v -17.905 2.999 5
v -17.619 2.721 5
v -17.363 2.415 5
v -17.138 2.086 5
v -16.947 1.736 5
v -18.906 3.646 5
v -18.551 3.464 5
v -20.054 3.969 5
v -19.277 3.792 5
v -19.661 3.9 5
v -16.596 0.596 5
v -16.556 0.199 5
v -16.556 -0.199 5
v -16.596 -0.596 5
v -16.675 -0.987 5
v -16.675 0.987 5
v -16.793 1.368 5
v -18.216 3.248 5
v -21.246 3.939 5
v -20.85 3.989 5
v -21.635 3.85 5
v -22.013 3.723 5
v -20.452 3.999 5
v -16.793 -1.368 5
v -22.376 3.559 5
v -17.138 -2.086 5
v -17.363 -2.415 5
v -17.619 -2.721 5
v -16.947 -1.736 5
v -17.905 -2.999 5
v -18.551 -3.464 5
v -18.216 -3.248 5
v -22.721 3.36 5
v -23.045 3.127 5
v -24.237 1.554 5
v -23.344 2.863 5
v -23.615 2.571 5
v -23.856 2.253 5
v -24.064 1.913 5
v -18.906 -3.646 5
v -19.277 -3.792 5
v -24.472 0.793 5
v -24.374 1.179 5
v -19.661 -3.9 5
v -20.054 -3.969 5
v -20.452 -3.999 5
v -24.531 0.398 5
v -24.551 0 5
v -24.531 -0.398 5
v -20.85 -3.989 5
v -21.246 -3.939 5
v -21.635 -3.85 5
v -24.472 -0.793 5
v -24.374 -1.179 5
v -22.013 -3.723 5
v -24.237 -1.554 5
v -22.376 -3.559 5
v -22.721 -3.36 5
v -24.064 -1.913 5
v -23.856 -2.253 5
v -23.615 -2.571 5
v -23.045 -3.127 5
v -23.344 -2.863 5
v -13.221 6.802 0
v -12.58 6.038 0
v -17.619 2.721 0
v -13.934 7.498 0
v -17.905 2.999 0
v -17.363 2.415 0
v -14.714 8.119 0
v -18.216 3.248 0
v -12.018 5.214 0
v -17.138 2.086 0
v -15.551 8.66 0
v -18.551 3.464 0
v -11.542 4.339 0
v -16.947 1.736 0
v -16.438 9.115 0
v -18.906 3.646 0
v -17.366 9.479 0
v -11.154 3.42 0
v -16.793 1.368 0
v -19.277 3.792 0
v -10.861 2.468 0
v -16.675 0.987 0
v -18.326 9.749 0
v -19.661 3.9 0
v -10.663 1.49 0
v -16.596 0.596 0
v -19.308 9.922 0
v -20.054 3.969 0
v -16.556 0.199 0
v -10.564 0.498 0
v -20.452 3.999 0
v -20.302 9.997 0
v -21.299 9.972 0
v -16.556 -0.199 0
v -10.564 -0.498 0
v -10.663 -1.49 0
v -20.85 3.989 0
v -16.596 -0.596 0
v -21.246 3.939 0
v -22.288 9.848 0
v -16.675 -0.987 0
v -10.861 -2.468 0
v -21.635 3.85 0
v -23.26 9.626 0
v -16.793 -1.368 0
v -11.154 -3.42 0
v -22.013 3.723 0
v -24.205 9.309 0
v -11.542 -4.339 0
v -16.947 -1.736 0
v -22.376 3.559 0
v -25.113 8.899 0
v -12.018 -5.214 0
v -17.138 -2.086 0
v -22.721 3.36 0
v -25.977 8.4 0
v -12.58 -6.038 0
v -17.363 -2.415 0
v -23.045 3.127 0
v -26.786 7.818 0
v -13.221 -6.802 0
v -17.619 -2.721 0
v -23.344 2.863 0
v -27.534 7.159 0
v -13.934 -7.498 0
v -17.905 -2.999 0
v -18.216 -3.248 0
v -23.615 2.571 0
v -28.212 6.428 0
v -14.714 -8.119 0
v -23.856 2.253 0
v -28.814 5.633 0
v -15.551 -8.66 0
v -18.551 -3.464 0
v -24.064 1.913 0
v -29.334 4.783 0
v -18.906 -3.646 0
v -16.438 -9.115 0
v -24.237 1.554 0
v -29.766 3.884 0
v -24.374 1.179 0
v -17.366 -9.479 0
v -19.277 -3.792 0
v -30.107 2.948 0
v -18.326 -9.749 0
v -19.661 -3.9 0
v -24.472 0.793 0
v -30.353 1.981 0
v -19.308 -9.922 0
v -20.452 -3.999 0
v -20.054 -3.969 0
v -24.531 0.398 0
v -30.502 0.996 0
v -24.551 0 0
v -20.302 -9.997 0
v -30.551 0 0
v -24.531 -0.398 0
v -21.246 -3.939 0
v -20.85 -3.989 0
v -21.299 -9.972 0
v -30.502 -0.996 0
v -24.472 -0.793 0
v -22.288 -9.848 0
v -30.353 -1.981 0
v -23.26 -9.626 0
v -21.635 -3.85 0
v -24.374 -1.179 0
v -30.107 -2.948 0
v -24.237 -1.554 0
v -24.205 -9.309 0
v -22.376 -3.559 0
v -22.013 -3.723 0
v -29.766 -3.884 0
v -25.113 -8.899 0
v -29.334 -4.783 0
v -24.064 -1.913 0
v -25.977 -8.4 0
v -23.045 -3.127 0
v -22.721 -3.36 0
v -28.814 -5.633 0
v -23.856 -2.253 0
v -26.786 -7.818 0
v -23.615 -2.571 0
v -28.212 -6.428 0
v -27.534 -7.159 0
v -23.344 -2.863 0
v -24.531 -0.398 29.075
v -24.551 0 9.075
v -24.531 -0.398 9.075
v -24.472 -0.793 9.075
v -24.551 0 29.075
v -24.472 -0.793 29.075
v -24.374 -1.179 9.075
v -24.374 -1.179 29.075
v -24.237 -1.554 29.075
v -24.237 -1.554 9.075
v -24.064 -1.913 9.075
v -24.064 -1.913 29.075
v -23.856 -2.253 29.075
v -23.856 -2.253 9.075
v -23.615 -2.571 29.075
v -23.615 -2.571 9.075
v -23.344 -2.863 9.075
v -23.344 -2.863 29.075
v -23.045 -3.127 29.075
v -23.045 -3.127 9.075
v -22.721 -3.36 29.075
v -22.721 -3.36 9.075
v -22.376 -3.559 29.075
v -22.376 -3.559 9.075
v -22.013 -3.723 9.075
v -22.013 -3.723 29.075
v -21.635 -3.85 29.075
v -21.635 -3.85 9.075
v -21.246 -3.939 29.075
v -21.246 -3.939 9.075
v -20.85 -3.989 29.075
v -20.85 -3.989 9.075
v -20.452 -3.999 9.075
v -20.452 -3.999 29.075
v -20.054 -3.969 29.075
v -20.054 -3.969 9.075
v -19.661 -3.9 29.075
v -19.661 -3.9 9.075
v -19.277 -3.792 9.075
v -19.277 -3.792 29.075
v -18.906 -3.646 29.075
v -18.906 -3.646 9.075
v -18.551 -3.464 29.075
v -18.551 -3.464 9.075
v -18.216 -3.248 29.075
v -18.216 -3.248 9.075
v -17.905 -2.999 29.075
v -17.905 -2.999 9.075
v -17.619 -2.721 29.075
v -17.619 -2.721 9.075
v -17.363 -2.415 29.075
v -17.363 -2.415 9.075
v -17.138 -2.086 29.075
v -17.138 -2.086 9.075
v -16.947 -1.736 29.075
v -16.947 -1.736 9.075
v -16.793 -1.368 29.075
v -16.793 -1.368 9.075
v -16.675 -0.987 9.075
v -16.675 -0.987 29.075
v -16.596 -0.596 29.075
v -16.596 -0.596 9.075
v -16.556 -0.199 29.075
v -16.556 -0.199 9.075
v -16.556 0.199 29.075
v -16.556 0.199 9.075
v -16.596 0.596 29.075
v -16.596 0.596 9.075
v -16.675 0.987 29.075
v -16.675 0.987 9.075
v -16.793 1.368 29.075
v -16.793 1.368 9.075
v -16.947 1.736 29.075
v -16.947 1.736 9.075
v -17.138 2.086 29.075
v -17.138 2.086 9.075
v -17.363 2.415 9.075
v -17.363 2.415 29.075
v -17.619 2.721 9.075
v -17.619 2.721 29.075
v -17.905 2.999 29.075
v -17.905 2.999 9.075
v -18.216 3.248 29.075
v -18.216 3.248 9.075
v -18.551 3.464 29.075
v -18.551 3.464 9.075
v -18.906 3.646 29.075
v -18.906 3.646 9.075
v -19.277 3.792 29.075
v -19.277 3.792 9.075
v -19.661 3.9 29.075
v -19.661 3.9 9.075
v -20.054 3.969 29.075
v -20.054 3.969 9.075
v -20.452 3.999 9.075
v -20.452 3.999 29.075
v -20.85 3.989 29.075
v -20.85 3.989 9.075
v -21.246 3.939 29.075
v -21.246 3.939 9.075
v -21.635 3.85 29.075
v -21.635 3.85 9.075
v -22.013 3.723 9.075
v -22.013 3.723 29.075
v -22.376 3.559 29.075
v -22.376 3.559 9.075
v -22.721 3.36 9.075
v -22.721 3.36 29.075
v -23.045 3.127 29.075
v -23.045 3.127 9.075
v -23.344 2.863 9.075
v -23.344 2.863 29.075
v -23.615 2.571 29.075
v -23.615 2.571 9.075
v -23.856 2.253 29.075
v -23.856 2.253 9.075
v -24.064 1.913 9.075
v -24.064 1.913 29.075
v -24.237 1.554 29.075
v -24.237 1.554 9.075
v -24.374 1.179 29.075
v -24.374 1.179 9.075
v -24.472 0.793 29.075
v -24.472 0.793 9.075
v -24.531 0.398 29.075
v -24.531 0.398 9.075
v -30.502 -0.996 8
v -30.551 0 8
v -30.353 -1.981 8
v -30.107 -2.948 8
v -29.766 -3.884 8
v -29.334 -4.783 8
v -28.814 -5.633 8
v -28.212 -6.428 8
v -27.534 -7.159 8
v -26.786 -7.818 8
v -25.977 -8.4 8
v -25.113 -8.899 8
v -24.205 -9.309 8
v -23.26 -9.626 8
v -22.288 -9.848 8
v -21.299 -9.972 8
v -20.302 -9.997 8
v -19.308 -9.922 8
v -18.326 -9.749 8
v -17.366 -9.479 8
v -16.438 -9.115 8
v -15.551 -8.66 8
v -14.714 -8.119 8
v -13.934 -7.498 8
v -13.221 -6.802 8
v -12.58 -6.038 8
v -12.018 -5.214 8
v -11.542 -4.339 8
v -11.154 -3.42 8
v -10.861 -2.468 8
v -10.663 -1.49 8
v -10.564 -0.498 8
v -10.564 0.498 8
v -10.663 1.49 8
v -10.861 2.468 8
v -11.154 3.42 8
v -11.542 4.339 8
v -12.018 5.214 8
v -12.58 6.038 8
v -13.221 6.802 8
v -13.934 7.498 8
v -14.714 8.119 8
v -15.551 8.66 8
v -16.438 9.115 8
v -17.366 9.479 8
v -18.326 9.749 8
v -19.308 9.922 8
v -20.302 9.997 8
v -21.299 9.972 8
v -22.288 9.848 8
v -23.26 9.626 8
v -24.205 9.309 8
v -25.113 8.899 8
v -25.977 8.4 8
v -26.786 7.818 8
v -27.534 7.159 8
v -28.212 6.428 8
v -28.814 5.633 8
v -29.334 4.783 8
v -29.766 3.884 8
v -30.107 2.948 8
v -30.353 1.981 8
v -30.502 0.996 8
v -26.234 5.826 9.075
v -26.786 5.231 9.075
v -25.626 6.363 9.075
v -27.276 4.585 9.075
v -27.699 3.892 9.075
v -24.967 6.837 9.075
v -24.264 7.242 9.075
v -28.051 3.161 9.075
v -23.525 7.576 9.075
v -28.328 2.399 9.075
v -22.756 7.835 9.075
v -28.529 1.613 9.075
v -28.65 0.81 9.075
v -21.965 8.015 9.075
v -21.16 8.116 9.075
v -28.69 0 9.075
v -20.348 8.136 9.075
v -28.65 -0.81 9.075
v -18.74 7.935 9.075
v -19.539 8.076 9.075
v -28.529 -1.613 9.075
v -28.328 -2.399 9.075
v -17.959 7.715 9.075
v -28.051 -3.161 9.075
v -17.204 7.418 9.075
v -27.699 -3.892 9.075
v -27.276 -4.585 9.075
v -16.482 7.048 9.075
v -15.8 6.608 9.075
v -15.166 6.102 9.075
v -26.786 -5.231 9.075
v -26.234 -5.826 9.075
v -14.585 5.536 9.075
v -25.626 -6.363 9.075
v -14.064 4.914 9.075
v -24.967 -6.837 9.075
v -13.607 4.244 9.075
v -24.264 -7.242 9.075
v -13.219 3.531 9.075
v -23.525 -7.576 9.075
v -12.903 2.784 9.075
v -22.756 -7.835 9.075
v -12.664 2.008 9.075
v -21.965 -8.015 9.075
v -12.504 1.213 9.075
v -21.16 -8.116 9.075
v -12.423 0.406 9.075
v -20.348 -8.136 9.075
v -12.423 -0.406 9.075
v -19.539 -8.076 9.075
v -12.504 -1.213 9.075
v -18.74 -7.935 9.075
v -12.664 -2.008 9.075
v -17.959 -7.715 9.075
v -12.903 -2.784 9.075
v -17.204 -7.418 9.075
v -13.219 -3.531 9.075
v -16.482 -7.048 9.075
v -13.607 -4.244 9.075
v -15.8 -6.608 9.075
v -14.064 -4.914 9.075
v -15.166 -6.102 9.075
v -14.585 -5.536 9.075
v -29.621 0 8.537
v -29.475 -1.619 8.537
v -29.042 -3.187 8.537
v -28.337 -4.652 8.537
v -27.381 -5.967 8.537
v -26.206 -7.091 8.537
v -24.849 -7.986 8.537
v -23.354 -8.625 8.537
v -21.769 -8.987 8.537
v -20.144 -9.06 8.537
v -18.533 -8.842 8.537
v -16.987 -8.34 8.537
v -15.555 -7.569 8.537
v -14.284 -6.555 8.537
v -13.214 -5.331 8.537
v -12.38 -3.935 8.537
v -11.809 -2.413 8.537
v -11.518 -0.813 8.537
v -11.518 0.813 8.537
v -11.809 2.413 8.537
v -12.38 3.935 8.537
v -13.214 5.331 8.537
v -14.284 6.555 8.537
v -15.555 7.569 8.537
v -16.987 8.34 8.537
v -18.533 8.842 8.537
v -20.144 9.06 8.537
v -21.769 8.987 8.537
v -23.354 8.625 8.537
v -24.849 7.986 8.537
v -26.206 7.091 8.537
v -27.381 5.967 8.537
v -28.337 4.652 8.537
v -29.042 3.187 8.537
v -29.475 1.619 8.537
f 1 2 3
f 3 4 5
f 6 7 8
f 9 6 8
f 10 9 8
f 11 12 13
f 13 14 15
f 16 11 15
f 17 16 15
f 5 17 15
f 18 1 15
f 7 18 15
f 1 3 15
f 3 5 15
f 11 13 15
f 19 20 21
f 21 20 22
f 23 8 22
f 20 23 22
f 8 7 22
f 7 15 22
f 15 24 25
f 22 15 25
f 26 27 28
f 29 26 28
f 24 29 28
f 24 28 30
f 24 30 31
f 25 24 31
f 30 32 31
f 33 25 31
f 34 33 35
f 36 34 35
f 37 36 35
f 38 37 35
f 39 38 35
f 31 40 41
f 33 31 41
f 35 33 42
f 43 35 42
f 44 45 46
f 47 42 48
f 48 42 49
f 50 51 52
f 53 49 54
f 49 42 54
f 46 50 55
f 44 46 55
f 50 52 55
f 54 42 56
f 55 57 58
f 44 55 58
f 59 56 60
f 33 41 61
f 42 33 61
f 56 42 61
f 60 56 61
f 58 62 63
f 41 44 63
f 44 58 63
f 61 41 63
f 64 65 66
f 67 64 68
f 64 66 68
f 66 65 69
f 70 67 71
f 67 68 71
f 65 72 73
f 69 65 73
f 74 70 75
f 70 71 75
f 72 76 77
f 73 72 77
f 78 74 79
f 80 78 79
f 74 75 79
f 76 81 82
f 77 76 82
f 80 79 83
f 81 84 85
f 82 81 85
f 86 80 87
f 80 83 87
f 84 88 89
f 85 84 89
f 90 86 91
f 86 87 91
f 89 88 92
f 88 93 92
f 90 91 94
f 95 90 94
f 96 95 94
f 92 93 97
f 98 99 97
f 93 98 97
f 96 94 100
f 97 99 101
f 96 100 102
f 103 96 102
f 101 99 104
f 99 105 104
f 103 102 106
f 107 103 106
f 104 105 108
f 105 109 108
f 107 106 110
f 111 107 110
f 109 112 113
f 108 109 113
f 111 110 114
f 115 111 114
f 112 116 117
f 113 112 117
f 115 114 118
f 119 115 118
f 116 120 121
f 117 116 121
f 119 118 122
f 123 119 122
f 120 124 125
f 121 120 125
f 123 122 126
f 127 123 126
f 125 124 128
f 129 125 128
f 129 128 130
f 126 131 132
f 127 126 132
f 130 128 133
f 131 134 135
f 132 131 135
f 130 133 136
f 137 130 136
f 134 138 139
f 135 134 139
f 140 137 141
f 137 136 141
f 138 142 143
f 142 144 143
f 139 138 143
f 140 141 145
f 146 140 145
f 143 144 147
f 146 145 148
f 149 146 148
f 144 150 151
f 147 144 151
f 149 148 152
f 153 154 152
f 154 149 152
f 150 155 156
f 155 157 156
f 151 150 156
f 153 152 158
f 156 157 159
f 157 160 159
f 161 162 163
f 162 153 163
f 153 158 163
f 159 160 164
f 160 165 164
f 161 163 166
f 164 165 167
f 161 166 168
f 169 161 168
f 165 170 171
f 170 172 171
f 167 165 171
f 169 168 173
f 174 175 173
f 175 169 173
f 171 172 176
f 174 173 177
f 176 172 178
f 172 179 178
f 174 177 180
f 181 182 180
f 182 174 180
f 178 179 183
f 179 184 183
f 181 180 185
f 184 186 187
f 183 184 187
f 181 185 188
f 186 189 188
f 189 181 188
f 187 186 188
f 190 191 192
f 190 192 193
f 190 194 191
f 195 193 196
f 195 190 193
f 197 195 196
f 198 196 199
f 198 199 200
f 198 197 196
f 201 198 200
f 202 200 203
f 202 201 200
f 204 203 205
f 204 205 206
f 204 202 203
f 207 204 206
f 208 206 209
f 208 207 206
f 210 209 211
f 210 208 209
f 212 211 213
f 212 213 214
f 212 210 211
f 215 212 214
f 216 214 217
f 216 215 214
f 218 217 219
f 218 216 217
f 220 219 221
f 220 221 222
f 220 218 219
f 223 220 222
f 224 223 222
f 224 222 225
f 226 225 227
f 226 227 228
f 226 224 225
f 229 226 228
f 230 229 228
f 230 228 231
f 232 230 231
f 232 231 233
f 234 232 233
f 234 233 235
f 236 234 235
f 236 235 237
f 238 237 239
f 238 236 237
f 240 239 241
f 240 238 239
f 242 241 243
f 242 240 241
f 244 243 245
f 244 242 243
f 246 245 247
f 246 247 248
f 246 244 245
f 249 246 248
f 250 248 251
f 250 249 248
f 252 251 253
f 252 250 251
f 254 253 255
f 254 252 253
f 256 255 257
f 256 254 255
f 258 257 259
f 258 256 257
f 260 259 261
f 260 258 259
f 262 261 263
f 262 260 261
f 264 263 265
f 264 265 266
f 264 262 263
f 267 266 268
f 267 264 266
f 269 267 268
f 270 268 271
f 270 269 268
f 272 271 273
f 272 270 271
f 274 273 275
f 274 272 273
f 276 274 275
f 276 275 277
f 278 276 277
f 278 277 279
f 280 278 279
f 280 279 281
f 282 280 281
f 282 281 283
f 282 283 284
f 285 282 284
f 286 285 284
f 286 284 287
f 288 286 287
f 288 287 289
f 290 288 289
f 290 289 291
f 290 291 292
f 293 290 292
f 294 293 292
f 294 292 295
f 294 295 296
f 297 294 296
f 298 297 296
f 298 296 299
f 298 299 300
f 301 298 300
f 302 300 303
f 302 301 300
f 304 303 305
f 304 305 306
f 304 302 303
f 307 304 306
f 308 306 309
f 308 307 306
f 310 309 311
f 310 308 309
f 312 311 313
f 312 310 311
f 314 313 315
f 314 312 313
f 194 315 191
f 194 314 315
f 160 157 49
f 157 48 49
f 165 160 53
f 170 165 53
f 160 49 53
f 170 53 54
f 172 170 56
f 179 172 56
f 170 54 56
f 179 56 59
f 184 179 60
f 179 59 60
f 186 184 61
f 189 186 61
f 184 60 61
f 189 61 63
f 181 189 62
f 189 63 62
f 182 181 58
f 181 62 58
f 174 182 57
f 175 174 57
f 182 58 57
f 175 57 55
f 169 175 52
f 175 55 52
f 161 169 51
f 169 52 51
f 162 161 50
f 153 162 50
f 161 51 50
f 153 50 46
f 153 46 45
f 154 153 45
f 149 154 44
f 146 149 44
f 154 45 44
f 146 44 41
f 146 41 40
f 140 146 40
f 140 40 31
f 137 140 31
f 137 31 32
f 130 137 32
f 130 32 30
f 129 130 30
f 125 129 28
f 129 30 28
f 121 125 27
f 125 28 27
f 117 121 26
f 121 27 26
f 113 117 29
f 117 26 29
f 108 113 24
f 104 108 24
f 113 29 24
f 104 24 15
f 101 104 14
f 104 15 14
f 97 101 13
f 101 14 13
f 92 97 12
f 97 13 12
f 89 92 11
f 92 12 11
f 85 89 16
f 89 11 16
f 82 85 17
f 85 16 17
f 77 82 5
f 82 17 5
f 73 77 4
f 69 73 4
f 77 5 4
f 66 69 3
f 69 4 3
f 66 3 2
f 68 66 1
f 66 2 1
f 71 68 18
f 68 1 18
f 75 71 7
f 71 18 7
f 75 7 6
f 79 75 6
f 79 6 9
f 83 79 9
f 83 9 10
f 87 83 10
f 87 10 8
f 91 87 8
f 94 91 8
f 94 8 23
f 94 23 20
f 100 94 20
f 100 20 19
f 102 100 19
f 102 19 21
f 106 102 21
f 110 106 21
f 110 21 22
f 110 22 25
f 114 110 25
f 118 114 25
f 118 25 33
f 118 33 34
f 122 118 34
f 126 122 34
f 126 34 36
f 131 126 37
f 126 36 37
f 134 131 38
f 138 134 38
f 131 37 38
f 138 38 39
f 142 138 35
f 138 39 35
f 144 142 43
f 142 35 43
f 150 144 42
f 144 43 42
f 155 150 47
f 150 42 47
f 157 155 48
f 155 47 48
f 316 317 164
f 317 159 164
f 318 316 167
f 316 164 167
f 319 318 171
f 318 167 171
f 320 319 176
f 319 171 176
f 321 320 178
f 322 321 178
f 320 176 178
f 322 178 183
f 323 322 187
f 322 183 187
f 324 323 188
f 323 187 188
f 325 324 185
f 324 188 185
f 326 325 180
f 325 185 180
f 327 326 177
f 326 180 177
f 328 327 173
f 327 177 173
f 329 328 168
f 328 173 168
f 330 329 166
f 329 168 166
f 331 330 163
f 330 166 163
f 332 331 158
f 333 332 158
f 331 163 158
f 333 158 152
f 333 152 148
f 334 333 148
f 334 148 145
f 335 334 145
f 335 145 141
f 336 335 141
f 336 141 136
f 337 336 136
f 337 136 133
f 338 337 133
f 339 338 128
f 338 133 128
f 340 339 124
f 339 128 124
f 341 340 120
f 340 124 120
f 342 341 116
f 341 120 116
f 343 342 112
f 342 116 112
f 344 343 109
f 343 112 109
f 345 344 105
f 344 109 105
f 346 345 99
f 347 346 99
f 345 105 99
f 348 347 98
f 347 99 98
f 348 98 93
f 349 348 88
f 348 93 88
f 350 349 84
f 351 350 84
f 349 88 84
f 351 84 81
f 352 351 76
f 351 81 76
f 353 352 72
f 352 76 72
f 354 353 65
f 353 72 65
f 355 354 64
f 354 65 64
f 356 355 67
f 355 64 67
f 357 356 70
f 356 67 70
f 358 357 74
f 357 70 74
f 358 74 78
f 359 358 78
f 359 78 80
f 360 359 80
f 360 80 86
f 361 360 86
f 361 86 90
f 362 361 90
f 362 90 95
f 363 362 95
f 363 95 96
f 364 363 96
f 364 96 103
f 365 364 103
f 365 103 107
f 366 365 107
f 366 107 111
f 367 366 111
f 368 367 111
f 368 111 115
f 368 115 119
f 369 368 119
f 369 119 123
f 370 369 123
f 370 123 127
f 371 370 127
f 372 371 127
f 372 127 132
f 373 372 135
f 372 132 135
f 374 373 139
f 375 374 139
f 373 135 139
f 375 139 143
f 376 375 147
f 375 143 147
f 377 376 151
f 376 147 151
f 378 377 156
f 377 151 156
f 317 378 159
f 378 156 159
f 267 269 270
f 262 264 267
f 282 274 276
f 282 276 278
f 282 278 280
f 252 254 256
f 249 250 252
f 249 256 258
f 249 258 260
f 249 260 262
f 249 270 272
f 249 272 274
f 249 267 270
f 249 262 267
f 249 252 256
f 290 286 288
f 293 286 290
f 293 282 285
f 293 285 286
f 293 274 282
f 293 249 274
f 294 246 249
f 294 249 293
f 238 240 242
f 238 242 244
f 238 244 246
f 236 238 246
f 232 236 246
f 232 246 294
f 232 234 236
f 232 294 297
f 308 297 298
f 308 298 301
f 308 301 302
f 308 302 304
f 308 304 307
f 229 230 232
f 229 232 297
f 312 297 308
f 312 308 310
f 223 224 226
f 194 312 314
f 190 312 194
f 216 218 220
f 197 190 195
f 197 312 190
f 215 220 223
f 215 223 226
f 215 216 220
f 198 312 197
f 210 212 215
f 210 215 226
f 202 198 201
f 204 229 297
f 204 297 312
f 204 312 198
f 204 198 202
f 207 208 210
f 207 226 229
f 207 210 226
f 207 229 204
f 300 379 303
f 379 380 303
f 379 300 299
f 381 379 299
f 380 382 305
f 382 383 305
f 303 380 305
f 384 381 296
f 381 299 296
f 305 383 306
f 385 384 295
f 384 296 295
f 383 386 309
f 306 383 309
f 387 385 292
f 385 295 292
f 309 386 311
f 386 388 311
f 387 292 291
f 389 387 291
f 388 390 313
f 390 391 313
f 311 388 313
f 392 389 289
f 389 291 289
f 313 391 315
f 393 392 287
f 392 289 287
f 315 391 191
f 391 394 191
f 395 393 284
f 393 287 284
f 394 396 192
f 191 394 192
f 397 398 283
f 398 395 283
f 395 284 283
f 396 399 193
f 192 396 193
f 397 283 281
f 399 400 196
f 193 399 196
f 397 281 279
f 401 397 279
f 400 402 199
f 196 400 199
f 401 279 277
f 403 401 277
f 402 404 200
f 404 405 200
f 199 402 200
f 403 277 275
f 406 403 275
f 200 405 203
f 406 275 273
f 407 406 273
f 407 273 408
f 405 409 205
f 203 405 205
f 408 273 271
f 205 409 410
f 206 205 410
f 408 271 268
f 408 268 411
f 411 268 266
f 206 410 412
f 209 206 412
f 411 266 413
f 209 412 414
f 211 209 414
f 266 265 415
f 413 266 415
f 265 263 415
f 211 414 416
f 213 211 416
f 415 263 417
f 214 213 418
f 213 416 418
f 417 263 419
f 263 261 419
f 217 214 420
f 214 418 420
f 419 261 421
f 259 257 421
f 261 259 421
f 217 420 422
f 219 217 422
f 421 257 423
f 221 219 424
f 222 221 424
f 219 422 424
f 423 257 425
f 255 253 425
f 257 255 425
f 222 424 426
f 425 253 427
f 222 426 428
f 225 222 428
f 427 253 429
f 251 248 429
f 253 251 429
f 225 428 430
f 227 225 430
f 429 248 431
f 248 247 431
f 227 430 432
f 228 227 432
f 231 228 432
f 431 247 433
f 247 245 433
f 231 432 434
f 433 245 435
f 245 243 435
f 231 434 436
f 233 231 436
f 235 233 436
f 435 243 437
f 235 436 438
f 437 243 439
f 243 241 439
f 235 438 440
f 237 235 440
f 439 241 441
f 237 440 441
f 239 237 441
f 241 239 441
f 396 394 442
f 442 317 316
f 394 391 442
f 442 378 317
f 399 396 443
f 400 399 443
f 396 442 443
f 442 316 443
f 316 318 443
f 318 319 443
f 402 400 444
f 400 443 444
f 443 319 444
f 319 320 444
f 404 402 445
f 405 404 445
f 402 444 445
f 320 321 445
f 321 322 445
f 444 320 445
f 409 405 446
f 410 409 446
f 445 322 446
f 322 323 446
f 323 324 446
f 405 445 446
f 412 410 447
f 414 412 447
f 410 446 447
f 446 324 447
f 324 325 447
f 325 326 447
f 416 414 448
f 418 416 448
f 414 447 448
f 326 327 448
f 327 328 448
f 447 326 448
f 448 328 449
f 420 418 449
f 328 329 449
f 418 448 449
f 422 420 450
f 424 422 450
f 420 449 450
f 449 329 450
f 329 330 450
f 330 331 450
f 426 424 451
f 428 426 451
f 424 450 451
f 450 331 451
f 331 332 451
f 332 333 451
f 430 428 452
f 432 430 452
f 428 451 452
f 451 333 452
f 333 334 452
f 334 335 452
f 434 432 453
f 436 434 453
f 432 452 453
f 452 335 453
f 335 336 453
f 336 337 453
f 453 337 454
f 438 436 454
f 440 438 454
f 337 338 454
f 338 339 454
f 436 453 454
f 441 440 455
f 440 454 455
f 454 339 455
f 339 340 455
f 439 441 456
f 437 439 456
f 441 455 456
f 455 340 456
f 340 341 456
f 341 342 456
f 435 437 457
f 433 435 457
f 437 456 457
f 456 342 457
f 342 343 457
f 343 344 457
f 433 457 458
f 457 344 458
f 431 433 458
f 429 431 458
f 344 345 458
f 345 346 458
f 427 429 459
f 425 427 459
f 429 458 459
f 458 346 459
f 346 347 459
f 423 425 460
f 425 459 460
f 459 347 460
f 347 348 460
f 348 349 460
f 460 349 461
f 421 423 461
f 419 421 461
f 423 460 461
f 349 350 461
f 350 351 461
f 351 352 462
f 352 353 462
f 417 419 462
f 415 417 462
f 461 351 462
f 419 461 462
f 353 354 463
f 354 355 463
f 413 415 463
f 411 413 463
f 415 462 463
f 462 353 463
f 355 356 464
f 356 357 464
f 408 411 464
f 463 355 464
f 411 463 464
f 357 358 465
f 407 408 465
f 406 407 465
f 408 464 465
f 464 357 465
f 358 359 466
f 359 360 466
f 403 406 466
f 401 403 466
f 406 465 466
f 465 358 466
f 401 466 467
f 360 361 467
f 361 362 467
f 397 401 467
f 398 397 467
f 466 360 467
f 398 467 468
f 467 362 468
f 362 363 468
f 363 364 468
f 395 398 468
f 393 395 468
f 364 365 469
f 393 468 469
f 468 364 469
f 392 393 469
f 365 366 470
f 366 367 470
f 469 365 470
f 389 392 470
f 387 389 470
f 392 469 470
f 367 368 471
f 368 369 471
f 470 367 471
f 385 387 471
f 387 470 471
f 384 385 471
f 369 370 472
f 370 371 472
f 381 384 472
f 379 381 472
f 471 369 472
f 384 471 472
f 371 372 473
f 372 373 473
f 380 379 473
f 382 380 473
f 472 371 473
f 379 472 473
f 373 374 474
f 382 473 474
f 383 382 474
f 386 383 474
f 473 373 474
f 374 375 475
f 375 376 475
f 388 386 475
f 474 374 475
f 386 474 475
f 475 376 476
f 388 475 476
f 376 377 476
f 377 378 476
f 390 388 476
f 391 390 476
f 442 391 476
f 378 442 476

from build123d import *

# Parameters (mm, degrees)
F0_W   = 4
F0_H   = 20
F0_H_2 = 3
F0_H_3 = 1.0746234533


with BuildPart() as f1:
    # F0 (on Front) → F1 (revolve)
    with BuildSketch(Plane.XZ):
        with Locations((-22.5513077103, 19.0746234533)):
            Rectangle(F0_W, F0_H)
        Polygon((-24.5513077103, 8), (-30.5513077103, 8), (-30.5513077103, 0), (-24.5513077103, 0), (-24.5513077103, 5), align=None)
        Polygon((-28.6900052902, 9.0746234533), (-30.5513077103, 8), (-24.5513077103, 8), (-24.5513077103, 9.0746234533), align=None)
        with Locations((-22.5513077103, 6.5)):
            Rectangle(F0_W, F0_H_2)
        with Locations((-22.5513077103, 8.5373117267)):
            Rectangle(F0_W, F0_H_3)
    revolve(axis=Axis((-20.5513077103, 0, 19.0746234533), (0, 0, 1)))


solid = f1.part
